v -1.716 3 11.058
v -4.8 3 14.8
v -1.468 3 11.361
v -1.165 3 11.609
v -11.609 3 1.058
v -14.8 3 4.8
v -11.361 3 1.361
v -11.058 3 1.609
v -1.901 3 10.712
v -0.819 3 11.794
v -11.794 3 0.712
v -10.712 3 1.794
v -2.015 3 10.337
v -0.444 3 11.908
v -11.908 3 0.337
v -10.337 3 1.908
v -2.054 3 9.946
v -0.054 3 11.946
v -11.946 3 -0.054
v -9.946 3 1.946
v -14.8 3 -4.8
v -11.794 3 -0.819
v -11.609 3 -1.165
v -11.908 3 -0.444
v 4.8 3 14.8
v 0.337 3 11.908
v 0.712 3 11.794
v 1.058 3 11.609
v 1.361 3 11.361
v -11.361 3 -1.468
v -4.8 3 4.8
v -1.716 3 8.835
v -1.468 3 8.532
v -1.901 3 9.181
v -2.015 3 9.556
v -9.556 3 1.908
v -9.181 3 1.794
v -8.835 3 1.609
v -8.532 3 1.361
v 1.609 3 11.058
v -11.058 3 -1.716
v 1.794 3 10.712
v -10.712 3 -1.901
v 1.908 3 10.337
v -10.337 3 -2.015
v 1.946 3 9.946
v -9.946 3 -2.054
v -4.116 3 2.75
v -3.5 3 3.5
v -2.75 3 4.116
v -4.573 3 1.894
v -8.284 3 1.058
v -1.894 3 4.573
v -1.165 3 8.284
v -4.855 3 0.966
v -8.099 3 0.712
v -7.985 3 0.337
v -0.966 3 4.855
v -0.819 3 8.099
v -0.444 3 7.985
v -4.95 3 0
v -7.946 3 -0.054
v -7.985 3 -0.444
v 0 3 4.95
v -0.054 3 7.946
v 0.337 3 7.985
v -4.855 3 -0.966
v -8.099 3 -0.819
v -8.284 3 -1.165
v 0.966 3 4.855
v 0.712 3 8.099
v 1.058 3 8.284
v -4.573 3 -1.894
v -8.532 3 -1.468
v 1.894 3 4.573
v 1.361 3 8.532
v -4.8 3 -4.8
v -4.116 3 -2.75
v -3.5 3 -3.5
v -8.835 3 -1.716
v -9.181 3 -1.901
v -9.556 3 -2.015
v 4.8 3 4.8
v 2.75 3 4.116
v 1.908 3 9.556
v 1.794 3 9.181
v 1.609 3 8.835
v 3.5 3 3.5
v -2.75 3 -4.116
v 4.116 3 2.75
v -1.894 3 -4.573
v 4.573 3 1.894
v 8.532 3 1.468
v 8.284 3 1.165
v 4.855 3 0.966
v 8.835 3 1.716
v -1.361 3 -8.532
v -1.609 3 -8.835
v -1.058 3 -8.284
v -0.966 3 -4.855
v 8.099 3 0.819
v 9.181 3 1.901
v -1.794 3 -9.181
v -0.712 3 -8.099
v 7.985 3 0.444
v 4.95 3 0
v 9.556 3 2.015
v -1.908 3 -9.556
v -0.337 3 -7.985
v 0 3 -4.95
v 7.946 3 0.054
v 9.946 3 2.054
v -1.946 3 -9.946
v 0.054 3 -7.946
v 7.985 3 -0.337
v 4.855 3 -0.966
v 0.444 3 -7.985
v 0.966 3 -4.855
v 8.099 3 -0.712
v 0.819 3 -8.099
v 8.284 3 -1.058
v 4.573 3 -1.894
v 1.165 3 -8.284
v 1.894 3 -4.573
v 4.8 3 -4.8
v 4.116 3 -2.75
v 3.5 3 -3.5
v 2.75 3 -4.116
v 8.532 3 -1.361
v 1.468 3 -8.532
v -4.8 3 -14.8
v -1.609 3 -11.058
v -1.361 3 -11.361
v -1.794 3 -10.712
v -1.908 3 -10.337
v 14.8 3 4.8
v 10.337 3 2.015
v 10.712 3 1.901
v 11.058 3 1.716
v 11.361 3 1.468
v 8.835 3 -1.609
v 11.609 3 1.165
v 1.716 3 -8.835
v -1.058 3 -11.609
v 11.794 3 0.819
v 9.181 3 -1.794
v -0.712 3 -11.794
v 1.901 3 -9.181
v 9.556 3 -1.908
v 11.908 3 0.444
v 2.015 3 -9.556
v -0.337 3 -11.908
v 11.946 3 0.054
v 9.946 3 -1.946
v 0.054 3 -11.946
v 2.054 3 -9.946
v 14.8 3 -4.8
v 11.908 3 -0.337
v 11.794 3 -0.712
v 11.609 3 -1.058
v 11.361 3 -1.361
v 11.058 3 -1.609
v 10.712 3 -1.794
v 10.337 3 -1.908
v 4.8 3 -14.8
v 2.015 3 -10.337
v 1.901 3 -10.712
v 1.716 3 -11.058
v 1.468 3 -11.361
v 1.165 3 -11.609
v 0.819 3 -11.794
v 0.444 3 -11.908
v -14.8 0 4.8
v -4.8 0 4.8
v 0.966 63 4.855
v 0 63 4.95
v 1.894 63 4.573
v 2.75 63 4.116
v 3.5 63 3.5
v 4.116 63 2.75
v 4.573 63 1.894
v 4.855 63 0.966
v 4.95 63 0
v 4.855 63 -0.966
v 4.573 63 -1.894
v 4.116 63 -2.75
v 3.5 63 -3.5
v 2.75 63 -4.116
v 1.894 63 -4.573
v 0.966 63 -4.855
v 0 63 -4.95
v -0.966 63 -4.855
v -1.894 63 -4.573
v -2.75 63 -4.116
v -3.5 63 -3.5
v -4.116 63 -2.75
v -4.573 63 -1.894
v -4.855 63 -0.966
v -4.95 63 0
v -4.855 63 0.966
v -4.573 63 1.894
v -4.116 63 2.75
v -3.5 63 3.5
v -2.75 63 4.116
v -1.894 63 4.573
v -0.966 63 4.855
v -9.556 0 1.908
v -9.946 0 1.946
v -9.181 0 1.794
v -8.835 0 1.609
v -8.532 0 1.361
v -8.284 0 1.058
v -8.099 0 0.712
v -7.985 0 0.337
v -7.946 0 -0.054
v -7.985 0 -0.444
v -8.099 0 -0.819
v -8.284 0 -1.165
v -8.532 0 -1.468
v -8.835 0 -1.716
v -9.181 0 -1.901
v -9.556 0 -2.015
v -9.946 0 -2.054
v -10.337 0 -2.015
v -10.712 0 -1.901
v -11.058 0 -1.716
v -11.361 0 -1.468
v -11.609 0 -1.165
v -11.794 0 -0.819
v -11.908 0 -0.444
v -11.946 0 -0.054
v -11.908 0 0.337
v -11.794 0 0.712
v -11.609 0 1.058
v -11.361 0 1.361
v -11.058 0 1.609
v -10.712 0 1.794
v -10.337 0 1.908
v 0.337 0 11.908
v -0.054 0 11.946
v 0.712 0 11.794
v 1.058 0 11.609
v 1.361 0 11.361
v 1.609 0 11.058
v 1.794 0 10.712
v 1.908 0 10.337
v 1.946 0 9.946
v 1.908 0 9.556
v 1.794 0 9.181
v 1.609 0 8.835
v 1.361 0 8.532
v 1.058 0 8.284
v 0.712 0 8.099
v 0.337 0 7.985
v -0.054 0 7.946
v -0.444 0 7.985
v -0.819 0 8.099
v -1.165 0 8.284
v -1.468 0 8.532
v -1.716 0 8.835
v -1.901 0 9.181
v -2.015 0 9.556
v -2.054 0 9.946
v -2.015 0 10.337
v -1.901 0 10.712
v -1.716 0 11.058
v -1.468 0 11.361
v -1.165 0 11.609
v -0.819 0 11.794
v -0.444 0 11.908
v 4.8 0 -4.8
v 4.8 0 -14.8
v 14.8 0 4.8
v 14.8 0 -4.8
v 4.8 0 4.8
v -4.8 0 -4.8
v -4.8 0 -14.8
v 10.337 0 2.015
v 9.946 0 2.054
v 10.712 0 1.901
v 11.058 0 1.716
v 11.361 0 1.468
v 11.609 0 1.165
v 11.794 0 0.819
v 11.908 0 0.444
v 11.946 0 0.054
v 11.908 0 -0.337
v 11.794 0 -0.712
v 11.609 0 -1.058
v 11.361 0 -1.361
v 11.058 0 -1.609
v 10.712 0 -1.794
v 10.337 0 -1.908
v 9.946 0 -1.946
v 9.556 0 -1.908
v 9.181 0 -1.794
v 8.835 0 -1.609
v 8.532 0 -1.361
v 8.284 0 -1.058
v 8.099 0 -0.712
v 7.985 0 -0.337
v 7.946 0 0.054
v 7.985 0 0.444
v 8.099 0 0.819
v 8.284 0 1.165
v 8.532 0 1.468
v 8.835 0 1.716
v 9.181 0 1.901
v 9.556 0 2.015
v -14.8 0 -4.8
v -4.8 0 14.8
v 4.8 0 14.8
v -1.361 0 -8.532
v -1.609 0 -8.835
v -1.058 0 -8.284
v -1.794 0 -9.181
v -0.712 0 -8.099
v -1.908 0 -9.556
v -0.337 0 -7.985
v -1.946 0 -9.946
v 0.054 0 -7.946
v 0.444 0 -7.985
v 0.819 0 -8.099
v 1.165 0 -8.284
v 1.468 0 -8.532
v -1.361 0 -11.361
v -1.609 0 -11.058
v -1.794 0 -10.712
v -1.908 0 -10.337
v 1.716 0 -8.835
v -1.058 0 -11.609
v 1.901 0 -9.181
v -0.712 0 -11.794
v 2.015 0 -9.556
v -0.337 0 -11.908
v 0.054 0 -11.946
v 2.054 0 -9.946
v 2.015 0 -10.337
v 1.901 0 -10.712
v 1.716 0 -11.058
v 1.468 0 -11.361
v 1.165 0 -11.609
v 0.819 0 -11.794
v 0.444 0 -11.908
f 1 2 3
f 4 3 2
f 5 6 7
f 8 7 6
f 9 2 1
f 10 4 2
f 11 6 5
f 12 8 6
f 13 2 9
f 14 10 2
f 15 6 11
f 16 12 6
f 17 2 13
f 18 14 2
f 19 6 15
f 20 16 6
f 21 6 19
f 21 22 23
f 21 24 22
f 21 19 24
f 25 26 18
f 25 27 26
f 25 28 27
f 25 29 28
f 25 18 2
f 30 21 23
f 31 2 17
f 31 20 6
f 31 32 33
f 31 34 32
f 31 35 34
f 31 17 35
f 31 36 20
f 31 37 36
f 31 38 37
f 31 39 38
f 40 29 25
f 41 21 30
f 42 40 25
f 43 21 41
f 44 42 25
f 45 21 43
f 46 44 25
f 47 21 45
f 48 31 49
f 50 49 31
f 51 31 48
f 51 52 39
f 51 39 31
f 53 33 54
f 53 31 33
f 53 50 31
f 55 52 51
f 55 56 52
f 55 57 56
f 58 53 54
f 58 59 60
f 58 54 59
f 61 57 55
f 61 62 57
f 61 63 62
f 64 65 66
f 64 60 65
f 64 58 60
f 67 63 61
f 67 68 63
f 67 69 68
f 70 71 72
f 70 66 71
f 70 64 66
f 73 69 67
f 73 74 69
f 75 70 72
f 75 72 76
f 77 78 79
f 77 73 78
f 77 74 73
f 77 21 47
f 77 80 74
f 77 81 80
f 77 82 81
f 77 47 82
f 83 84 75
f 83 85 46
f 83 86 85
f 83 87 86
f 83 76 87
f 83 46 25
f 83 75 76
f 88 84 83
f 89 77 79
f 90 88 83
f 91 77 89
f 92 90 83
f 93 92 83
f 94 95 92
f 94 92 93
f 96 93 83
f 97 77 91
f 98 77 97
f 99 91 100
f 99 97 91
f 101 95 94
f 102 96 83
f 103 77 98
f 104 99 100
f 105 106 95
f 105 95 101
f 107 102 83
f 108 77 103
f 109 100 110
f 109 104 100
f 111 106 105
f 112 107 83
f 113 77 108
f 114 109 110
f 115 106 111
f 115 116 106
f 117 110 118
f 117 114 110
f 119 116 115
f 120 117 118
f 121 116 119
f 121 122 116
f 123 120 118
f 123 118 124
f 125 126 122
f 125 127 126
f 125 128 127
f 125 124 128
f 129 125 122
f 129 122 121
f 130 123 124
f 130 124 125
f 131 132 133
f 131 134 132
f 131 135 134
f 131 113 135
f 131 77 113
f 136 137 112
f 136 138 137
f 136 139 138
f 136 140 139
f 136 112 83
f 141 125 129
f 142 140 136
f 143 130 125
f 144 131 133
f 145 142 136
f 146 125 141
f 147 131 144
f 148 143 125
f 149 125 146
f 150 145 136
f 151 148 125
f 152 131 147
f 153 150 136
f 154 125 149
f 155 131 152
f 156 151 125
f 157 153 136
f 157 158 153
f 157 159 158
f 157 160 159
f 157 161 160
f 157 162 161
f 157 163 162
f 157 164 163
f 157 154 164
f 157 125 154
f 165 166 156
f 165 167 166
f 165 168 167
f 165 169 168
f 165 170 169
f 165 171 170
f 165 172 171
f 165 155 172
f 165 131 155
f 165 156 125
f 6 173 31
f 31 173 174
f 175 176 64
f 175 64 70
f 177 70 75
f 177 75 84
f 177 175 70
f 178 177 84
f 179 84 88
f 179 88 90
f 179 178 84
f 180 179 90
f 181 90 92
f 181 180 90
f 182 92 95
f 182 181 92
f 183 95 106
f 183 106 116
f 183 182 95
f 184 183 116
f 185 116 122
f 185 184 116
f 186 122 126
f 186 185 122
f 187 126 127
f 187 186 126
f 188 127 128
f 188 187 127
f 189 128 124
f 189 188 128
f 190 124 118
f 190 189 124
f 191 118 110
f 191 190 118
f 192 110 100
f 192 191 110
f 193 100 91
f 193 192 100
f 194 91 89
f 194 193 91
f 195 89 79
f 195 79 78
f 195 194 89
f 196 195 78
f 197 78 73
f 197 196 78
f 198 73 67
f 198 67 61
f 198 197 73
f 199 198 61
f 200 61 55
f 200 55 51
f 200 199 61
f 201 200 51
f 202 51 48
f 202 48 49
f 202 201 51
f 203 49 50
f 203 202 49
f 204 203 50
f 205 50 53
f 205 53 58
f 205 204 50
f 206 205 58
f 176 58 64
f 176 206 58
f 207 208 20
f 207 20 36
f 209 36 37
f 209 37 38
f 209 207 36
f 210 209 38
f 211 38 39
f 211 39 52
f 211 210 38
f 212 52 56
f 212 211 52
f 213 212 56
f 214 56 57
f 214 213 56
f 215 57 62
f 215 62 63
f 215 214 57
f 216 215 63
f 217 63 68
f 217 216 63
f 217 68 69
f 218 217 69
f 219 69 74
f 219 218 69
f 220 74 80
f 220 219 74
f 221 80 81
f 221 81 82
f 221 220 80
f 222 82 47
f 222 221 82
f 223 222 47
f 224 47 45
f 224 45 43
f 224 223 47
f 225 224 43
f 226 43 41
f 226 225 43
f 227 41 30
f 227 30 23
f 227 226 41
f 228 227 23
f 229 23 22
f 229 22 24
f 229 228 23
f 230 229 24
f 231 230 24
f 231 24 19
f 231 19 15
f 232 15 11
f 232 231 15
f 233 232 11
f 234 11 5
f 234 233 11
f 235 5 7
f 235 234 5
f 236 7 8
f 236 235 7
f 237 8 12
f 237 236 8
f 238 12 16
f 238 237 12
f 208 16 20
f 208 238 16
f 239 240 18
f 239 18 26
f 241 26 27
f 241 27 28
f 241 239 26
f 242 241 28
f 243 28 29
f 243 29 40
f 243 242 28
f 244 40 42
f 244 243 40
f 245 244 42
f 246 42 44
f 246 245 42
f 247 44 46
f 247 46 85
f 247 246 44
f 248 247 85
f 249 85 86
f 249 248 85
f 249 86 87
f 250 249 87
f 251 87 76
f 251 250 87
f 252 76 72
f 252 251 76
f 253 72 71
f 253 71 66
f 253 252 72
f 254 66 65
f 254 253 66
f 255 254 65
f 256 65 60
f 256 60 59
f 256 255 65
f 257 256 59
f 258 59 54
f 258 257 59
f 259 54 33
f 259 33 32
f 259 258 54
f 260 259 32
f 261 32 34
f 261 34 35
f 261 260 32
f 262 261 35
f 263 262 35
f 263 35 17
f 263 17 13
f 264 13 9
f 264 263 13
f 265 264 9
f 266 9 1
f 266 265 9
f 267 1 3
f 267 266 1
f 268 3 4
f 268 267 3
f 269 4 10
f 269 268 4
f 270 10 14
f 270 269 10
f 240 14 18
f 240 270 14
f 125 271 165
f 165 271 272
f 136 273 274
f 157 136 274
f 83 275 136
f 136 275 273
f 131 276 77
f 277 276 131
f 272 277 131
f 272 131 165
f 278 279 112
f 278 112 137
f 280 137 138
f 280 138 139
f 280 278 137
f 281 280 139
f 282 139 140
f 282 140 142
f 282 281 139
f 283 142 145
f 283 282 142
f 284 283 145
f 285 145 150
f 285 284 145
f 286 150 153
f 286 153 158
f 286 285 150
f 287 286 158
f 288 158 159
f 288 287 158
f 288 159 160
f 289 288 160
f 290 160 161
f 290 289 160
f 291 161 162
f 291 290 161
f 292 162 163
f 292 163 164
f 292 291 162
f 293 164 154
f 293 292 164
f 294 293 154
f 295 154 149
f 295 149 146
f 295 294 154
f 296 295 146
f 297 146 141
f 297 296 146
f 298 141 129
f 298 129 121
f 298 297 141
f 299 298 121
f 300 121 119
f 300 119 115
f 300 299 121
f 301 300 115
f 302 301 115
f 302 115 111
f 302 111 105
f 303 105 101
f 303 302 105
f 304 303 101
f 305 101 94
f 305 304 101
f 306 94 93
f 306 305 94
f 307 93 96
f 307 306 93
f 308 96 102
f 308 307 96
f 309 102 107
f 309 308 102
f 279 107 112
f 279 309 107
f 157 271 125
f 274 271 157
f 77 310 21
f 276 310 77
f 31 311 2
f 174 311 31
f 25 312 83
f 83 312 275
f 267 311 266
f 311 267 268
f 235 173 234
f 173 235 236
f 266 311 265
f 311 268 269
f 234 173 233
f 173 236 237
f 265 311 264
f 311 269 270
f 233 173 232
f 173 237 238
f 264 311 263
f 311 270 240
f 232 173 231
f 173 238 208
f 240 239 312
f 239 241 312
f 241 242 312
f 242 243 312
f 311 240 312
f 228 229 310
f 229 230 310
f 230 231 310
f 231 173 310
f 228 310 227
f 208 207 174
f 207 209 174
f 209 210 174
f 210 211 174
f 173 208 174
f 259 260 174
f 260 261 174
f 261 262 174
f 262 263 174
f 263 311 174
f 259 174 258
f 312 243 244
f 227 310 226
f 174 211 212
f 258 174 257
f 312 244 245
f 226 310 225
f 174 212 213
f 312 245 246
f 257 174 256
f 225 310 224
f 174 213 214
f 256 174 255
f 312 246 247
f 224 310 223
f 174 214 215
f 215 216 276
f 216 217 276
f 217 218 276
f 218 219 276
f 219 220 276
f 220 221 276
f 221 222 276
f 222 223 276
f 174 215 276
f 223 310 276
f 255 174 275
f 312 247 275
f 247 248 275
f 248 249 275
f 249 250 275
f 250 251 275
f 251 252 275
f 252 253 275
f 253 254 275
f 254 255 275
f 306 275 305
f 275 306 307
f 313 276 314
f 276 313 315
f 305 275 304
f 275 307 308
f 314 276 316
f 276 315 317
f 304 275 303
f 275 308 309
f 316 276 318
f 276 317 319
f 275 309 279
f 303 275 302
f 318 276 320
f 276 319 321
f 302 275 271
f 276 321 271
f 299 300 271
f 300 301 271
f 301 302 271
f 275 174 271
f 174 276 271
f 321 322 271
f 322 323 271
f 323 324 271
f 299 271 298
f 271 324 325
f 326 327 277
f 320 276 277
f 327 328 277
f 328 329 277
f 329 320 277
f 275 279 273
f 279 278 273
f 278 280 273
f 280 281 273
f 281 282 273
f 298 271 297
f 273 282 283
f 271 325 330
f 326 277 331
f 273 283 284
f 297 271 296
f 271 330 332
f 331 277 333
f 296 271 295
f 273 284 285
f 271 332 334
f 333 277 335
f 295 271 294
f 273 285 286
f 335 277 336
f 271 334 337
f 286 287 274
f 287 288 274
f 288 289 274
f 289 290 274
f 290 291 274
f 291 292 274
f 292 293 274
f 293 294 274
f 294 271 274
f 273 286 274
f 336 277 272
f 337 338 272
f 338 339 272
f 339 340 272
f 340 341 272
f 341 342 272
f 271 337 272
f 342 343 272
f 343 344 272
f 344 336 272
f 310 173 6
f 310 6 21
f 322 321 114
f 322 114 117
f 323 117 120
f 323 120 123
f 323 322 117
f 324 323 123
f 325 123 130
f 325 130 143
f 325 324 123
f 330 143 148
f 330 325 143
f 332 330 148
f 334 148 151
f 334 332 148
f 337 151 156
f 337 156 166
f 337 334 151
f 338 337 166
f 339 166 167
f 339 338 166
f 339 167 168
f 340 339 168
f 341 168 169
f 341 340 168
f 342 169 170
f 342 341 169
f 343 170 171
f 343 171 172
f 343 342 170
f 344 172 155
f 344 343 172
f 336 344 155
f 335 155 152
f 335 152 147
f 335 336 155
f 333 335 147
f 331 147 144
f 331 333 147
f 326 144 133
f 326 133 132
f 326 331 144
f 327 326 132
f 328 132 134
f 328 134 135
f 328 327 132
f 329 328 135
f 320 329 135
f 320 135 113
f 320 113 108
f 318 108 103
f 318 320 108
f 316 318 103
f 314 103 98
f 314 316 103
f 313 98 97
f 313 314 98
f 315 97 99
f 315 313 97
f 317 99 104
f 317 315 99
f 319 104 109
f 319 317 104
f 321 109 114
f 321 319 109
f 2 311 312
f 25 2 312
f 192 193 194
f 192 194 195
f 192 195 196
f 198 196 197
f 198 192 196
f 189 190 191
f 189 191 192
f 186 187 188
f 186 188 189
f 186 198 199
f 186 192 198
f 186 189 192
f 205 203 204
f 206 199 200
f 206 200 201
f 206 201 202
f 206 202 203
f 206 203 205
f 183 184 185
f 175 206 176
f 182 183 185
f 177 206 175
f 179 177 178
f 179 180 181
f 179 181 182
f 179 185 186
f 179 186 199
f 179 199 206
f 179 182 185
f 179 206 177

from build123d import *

# Parameters (mm, degrees)
SKETCH_1_W          = 10
SKETCH_1_H          = 9.6
SKETCH_1_R          = 2
SKETCH_1_W_2        = 9.6
SKETCH_1_H_2        = 10
SKETCH_1_R_2        = 4
EXTRUDE_2_DEPTH     = 3
SKETCH_2_R          = 3.95
EXTRUDE_3_DEPTH     = 120
CUT_EXTRUDE_START   = -60
SKETCH_3_R          = 3.95
CUT_EXTRUDE_1_DEPTH = 60
SKETCH_4_R          = 4.95
EXTRUDE_4_DEPTH     = 60


with BuildPart() as part:
    # 草图1 → 凸台-拉伸2 (new body)
    # profile 1 of 6: a face of its own
    with BuildSketch(Plane(origin=(0, 0, 0), x_dir=(1, 0, 0), z_dir=(0, 1, 0))):
        with Locations((-9.8, 0)):
            Rectangle(SKETCH_1_W, SKETCH_1_H)
        with Locations(Location((-9.946440474, 0.053559526, 0), (0, 0, 270))):
            Circle(SKETCH_1_R, mode=Mode.SUBTRACT)
    # profile 2 of 6: a face of its own
    with BuildSketch(Plane(origin=(0, 0, 0), x_dir=(1, 0, 0), z_dir=(0, 1, 0))):
        with Locations((0, -9.8)):
            Rectangle(SKETCH_1_W_2, SKETCH_1_H_2)
        with Locations(Location((-0.053559526, -9.946440474, 0), (0, 0, 270))):
            Circle(SKETCH_1_R, mode=Mode.SUBTRACT)
    # profile 3 of 6: a face of its own
    with BuildSketch(Plane(origin=(0, 0, 0), x_dir=(1, 0, 0), z_dir=(0, 1, 0))):
        Rectangle(SKETCH_1_W_2, SKETCH_1_H)
        Circle(SKETCH_1_R_2, mode=Mode.SUBTRACT)
    # profile 4 of 6: a face of its own
    with BuildSketch(Plane(origin=(0, 0, 0), x_dir=(1, 0, 0), z_dir=(0, 1, 0))):
        with Locations((9.8, 0)):
            Rectangle(SKETCH_1_W, SKETCH_1_H)
        with Locations(Location((9.946440474, -0.053559526, 0), (0, 0, 270))):
            Circle(SKETCH_1_R, mode=Mode.SUBTRACT)
    # profile 5 of 6: a face of its own
    with BuildSketch(Plane(origin=(0, 0, 0), x_dir=(1, 0, 0), z_dir=(0, 1, 0))):
        with Locations((0, 9.8)):
            Rectangle(SKETCH_1_W_2, SKETCH_1_H_2)
        with Locations(Location((0.053559526, 9.946440474, 0), (0, 0, 270))):
            Circle(SKETCH_1_R, mode=Mode.SUBTRACT)
    # profile 6 of 6: a face of its own
    with BuildSketch(Plane(origin=(0, 0, 0), x_dir=(1, 0, 0), z_dir=(0, 1, 0))):
        Circle(SKETCH_1_R_2)
    extrude(amount=EXTRUDE_2_DEPTH)

    # 草图2 → 凸台-拉伸3 (add)
    with BuildSketch(Plane(origin=(0, 3, 0), x_dir=(1, 0, 0), z_dir=(0, 1, 0))):
        with Locations(Location((0, 0, 0), (0, 0, 270))):
            Circle(SKETCH_2_R)
    extrude(amount=EXTRUDE_3_DEPTH)

    # 草图3 → 切除-拉伸1 (cut)
    with BuildSketch(Plane(origin=(0, 123, 0), x_dir=(1, 0, 0), z_dir=(0, 1, 0)).offset(CUT_EXTRUDE_START)):
        with Locations(Location((0, 0, 0), (0, 0, 270))):
            Circle(SKETCH_3_R)
    extrude(amount=CUT_EXTRUDE_1_DEPTH, mode=Mode.SUBTRACT)

    # 草图4 → 凸台-拉伸4 (add)
    with BuildSketch(Plane(origin=(0, 63, 0), x_dir=(1, 0, 0), z_dir=(0, 1, 0))):
        with Locations(Location((0, 0, 0), (0, 0, 270))):
            Circle(SKETCH_4_R)
    extrude(amount=-EXTRUDE_4_DEPTH)


solid = part.part
